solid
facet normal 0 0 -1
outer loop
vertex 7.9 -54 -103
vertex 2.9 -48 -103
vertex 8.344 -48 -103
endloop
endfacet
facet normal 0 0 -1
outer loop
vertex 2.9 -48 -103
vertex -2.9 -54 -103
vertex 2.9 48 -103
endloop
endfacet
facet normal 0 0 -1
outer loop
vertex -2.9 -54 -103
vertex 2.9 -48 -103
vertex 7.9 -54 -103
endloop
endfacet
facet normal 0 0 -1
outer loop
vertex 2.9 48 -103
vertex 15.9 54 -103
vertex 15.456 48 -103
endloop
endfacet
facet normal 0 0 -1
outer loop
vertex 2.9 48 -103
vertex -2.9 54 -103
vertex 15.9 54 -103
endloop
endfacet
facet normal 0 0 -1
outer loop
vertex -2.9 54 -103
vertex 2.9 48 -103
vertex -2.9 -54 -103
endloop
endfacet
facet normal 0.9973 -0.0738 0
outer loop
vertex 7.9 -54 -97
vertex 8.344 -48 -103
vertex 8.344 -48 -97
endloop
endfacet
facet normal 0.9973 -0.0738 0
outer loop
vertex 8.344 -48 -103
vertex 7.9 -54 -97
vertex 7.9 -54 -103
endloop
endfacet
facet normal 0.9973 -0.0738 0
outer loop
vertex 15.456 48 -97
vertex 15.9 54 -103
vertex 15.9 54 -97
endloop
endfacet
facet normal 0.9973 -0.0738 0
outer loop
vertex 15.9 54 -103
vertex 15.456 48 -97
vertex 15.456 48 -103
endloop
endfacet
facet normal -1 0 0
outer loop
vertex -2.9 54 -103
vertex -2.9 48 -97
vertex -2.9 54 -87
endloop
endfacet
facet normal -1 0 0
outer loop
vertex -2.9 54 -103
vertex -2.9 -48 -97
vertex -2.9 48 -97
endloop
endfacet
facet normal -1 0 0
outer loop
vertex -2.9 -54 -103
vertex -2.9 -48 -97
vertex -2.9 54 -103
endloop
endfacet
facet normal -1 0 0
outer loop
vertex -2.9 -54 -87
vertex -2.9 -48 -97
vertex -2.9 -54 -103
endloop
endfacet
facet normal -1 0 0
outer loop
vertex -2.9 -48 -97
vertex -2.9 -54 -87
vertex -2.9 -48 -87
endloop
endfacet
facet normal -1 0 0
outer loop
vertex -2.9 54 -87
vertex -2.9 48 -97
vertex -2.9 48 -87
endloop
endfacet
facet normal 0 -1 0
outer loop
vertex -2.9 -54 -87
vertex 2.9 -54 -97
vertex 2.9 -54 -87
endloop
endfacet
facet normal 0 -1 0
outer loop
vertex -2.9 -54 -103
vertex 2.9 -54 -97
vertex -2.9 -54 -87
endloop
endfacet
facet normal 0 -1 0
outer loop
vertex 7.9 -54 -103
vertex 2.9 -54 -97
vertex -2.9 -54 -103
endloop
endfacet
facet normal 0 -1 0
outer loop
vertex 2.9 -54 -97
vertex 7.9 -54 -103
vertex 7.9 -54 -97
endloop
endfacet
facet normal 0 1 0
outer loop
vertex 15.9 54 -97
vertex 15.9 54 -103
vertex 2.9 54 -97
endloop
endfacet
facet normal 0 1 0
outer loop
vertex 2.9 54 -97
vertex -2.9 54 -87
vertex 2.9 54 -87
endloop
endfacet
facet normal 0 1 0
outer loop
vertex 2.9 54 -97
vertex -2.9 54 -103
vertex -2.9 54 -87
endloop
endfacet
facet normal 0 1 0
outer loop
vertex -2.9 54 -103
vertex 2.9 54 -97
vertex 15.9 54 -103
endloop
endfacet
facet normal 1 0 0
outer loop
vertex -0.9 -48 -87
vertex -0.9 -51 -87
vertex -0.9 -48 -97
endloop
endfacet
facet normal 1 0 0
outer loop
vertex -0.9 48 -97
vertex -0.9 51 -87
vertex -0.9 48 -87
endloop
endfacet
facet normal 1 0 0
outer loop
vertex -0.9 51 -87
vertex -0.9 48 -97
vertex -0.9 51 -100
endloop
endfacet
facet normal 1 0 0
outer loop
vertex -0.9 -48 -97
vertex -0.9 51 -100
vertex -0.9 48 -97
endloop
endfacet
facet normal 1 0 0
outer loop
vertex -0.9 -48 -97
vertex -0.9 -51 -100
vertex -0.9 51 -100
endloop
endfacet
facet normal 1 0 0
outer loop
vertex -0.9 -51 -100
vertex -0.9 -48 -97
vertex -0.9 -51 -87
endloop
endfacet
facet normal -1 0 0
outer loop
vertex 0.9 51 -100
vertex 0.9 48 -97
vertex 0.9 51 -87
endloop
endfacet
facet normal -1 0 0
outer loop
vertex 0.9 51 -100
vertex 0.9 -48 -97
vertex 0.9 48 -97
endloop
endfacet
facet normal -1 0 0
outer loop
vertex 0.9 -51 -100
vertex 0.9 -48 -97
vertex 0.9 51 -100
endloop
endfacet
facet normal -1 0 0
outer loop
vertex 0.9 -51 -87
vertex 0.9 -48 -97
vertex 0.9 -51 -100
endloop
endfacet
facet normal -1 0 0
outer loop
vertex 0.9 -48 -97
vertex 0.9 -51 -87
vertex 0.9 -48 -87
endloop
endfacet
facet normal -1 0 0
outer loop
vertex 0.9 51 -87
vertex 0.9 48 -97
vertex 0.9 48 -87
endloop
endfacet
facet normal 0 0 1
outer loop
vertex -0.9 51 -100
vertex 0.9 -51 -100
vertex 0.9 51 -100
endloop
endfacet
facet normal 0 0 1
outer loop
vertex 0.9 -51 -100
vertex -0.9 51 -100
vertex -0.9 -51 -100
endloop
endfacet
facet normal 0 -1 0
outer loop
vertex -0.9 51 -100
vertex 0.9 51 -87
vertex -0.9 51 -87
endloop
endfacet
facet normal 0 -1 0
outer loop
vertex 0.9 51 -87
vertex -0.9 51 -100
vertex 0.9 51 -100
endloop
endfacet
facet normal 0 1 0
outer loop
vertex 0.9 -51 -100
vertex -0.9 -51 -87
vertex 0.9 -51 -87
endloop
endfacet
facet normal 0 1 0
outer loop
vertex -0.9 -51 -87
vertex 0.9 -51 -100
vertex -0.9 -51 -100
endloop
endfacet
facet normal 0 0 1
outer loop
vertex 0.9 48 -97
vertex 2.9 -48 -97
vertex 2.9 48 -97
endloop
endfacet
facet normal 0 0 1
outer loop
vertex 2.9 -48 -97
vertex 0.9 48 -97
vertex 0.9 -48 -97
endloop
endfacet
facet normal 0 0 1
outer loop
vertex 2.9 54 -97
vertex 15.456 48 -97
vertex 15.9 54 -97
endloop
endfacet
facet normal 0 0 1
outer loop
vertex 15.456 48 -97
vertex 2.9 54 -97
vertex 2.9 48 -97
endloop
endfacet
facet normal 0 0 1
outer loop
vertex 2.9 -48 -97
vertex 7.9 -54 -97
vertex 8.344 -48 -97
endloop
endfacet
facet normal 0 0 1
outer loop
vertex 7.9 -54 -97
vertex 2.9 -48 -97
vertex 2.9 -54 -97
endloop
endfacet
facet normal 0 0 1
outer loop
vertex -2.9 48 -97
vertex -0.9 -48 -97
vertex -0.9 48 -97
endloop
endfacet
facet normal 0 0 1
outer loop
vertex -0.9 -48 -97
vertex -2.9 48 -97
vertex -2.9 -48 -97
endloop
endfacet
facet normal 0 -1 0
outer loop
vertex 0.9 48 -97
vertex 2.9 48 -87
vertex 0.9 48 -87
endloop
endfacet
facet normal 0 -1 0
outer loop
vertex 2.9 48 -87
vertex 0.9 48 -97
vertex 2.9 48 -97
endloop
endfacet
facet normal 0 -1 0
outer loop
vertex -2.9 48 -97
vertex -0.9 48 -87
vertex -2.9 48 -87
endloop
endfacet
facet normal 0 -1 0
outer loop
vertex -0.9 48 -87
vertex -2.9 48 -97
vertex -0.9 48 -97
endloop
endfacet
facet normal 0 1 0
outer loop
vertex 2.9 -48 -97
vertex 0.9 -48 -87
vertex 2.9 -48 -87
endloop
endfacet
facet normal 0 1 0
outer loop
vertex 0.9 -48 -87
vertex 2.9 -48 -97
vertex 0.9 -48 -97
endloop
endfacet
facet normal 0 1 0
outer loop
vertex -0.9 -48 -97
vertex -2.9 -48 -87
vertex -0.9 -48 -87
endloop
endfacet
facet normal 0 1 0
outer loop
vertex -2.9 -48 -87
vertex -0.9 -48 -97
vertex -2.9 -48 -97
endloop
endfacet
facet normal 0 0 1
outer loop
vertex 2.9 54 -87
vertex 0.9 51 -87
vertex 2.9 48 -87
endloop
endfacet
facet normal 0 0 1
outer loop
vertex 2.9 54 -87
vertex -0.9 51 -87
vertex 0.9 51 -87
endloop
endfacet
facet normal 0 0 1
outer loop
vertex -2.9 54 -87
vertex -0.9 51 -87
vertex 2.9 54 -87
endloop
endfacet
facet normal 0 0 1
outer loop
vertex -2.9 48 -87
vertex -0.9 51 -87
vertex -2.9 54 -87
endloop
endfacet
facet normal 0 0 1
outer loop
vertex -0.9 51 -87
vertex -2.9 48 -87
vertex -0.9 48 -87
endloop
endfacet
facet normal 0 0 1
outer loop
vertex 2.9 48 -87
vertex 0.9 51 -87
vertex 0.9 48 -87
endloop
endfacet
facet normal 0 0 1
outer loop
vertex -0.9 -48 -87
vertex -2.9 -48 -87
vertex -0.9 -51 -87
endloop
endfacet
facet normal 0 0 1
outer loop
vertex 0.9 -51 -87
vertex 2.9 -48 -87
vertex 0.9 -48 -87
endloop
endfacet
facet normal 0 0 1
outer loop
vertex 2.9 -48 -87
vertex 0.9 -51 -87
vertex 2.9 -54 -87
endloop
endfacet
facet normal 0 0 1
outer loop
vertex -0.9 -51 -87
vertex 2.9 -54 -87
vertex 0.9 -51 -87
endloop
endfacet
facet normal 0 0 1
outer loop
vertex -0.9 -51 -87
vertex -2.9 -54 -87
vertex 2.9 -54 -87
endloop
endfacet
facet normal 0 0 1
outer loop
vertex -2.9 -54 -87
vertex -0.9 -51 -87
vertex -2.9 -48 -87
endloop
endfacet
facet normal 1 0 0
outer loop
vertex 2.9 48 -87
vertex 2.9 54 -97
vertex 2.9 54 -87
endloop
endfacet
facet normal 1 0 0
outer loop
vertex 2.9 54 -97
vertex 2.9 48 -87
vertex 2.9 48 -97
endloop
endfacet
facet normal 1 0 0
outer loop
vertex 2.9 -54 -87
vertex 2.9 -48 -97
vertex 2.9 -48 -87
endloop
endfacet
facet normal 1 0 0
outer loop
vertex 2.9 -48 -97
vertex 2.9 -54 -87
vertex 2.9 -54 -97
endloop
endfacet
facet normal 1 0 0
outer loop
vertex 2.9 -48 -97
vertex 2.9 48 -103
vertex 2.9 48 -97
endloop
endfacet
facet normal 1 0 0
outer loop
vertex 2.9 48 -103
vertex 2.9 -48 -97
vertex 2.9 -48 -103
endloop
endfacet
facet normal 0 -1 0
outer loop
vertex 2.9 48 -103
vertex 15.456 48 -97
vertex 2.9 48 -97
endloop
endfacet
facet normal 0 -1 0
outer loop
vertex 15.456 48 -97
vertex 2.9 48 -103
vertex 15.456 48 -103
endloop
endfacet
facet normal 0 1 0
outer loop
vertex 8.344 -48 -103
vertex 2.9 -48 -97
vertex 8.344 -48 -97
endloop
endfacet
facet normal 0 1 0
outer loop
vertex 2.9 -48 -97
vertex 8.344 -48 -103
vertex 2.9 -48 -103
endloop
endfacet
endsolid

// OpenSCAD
ph=102;
pt=1.8;
om=3;
im=3;
hm=2;
pw=200;

plate_size=[pw, ph, pt];
plate_size2=[pw, ph, 0];
outer_margin=[om, om, hm];
inner_margin=[im, im, 0];

module wedge()
{
    rotate(v=[0,1,0], a=90)
    linear_extrude(height=pw+om*2, center=true)
    {
        rotate(v=[0,0,1], a=90)
        polygon([[-(ph/2 + om), -(pt/2 + hm)], [ph/2 + om, -(pt/2 + hm)],
                 [ph/2 + om, pt/2 + hm + 13], [-(ph/2 + om), pt/2 + hm + 5]]);
    }    
}

rotate(v=[0,1,0], a=-90)
difference()
{
difference()
{
    difference()
    {
        scale([1,1,-1]) wedge();
        cube(size=plate_size, center=true);
    }

    union()
    {
        cube(size=plate_size2 - 2*inner_margin + 2*[0, 0, 99], center=true);
        cube(size=plate_size2 - 2*inner_margin + 2*[-10, 99, 99], center=true);
        translate([0,0,-(pt/2+hm+10)]) cube(size=plate_size2 - 2*inner_margin + 2*[0, 99, 10], center=true);
        translate([0,0,-(pt/2+hm+10)]) cube(size=plate_size2 - 2*inner_margin + 2*[99, 0, 10], center=true);
    }
}
translate([100, 0, 0]) cube(size=[200,200,100], center=true);
}
